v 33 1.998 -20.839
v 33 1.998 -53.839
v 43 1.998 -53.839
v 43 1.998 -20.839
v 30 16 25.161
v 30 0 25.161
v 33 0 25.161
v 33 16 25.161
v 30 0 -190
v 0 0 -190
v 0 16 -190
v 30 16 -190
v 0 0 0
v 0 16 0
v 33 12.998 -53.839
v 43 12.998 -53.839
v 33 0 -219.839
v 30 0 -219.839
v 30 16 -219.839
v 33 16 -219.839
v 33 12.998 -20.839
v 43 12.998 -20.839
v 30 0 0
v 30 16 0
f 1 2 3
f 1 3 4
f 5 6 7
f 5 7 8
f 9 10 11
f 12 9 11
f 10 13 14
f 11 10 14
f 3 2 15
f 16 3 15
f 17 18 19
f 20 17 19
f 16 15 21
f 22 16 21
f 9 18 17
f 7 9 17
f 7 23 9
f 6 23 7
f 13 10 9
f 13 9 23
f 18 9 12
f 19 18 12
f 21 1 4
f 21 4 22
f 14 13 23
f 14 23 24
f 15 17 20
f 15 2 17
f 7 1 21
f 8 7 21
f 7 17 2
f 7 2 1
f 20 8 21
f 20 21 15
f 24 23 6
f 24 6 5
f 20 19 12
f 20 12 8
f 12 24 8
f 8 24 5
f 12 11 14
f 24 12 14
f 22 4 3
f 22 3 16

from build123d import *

# Parameters (mm, degrees)
F0_W     = 16
F0_H     = 190
F1_DEPTH = 30
F3_W     = 16
F3_H     = 245
F4_DEPTH = 3
F5_W     = 11
F5_H     = 33
F6_DEPTH = 10


with BuildPart() as f1:
    # F0 (on Right) → F1 (new body)
    with BuildSketch(Plane.YZ):
        with Locations((8, -95)):
            Rectangle(F0_W, F0_H)
    extrude(amount=F1_DEPTH)

    # F3 (on face) → F4 (join)
    with BuildSketch(Plane.YZ.offset(30)):
        with Locations((8, -97.338722)):
            Rectangle(F3_W, F3_H)
    extrude(amount=F4_DEPTH)

    # F5 (on face) → F6 (join)
    with BuildSketch(Plane.YZ.offset(33)):
        with Locations((7.497938, -37.338722)):
            Rectangle(F5_W, F5_H)
    extrude(amount=F6_DEPTH)


solid = f1.part
